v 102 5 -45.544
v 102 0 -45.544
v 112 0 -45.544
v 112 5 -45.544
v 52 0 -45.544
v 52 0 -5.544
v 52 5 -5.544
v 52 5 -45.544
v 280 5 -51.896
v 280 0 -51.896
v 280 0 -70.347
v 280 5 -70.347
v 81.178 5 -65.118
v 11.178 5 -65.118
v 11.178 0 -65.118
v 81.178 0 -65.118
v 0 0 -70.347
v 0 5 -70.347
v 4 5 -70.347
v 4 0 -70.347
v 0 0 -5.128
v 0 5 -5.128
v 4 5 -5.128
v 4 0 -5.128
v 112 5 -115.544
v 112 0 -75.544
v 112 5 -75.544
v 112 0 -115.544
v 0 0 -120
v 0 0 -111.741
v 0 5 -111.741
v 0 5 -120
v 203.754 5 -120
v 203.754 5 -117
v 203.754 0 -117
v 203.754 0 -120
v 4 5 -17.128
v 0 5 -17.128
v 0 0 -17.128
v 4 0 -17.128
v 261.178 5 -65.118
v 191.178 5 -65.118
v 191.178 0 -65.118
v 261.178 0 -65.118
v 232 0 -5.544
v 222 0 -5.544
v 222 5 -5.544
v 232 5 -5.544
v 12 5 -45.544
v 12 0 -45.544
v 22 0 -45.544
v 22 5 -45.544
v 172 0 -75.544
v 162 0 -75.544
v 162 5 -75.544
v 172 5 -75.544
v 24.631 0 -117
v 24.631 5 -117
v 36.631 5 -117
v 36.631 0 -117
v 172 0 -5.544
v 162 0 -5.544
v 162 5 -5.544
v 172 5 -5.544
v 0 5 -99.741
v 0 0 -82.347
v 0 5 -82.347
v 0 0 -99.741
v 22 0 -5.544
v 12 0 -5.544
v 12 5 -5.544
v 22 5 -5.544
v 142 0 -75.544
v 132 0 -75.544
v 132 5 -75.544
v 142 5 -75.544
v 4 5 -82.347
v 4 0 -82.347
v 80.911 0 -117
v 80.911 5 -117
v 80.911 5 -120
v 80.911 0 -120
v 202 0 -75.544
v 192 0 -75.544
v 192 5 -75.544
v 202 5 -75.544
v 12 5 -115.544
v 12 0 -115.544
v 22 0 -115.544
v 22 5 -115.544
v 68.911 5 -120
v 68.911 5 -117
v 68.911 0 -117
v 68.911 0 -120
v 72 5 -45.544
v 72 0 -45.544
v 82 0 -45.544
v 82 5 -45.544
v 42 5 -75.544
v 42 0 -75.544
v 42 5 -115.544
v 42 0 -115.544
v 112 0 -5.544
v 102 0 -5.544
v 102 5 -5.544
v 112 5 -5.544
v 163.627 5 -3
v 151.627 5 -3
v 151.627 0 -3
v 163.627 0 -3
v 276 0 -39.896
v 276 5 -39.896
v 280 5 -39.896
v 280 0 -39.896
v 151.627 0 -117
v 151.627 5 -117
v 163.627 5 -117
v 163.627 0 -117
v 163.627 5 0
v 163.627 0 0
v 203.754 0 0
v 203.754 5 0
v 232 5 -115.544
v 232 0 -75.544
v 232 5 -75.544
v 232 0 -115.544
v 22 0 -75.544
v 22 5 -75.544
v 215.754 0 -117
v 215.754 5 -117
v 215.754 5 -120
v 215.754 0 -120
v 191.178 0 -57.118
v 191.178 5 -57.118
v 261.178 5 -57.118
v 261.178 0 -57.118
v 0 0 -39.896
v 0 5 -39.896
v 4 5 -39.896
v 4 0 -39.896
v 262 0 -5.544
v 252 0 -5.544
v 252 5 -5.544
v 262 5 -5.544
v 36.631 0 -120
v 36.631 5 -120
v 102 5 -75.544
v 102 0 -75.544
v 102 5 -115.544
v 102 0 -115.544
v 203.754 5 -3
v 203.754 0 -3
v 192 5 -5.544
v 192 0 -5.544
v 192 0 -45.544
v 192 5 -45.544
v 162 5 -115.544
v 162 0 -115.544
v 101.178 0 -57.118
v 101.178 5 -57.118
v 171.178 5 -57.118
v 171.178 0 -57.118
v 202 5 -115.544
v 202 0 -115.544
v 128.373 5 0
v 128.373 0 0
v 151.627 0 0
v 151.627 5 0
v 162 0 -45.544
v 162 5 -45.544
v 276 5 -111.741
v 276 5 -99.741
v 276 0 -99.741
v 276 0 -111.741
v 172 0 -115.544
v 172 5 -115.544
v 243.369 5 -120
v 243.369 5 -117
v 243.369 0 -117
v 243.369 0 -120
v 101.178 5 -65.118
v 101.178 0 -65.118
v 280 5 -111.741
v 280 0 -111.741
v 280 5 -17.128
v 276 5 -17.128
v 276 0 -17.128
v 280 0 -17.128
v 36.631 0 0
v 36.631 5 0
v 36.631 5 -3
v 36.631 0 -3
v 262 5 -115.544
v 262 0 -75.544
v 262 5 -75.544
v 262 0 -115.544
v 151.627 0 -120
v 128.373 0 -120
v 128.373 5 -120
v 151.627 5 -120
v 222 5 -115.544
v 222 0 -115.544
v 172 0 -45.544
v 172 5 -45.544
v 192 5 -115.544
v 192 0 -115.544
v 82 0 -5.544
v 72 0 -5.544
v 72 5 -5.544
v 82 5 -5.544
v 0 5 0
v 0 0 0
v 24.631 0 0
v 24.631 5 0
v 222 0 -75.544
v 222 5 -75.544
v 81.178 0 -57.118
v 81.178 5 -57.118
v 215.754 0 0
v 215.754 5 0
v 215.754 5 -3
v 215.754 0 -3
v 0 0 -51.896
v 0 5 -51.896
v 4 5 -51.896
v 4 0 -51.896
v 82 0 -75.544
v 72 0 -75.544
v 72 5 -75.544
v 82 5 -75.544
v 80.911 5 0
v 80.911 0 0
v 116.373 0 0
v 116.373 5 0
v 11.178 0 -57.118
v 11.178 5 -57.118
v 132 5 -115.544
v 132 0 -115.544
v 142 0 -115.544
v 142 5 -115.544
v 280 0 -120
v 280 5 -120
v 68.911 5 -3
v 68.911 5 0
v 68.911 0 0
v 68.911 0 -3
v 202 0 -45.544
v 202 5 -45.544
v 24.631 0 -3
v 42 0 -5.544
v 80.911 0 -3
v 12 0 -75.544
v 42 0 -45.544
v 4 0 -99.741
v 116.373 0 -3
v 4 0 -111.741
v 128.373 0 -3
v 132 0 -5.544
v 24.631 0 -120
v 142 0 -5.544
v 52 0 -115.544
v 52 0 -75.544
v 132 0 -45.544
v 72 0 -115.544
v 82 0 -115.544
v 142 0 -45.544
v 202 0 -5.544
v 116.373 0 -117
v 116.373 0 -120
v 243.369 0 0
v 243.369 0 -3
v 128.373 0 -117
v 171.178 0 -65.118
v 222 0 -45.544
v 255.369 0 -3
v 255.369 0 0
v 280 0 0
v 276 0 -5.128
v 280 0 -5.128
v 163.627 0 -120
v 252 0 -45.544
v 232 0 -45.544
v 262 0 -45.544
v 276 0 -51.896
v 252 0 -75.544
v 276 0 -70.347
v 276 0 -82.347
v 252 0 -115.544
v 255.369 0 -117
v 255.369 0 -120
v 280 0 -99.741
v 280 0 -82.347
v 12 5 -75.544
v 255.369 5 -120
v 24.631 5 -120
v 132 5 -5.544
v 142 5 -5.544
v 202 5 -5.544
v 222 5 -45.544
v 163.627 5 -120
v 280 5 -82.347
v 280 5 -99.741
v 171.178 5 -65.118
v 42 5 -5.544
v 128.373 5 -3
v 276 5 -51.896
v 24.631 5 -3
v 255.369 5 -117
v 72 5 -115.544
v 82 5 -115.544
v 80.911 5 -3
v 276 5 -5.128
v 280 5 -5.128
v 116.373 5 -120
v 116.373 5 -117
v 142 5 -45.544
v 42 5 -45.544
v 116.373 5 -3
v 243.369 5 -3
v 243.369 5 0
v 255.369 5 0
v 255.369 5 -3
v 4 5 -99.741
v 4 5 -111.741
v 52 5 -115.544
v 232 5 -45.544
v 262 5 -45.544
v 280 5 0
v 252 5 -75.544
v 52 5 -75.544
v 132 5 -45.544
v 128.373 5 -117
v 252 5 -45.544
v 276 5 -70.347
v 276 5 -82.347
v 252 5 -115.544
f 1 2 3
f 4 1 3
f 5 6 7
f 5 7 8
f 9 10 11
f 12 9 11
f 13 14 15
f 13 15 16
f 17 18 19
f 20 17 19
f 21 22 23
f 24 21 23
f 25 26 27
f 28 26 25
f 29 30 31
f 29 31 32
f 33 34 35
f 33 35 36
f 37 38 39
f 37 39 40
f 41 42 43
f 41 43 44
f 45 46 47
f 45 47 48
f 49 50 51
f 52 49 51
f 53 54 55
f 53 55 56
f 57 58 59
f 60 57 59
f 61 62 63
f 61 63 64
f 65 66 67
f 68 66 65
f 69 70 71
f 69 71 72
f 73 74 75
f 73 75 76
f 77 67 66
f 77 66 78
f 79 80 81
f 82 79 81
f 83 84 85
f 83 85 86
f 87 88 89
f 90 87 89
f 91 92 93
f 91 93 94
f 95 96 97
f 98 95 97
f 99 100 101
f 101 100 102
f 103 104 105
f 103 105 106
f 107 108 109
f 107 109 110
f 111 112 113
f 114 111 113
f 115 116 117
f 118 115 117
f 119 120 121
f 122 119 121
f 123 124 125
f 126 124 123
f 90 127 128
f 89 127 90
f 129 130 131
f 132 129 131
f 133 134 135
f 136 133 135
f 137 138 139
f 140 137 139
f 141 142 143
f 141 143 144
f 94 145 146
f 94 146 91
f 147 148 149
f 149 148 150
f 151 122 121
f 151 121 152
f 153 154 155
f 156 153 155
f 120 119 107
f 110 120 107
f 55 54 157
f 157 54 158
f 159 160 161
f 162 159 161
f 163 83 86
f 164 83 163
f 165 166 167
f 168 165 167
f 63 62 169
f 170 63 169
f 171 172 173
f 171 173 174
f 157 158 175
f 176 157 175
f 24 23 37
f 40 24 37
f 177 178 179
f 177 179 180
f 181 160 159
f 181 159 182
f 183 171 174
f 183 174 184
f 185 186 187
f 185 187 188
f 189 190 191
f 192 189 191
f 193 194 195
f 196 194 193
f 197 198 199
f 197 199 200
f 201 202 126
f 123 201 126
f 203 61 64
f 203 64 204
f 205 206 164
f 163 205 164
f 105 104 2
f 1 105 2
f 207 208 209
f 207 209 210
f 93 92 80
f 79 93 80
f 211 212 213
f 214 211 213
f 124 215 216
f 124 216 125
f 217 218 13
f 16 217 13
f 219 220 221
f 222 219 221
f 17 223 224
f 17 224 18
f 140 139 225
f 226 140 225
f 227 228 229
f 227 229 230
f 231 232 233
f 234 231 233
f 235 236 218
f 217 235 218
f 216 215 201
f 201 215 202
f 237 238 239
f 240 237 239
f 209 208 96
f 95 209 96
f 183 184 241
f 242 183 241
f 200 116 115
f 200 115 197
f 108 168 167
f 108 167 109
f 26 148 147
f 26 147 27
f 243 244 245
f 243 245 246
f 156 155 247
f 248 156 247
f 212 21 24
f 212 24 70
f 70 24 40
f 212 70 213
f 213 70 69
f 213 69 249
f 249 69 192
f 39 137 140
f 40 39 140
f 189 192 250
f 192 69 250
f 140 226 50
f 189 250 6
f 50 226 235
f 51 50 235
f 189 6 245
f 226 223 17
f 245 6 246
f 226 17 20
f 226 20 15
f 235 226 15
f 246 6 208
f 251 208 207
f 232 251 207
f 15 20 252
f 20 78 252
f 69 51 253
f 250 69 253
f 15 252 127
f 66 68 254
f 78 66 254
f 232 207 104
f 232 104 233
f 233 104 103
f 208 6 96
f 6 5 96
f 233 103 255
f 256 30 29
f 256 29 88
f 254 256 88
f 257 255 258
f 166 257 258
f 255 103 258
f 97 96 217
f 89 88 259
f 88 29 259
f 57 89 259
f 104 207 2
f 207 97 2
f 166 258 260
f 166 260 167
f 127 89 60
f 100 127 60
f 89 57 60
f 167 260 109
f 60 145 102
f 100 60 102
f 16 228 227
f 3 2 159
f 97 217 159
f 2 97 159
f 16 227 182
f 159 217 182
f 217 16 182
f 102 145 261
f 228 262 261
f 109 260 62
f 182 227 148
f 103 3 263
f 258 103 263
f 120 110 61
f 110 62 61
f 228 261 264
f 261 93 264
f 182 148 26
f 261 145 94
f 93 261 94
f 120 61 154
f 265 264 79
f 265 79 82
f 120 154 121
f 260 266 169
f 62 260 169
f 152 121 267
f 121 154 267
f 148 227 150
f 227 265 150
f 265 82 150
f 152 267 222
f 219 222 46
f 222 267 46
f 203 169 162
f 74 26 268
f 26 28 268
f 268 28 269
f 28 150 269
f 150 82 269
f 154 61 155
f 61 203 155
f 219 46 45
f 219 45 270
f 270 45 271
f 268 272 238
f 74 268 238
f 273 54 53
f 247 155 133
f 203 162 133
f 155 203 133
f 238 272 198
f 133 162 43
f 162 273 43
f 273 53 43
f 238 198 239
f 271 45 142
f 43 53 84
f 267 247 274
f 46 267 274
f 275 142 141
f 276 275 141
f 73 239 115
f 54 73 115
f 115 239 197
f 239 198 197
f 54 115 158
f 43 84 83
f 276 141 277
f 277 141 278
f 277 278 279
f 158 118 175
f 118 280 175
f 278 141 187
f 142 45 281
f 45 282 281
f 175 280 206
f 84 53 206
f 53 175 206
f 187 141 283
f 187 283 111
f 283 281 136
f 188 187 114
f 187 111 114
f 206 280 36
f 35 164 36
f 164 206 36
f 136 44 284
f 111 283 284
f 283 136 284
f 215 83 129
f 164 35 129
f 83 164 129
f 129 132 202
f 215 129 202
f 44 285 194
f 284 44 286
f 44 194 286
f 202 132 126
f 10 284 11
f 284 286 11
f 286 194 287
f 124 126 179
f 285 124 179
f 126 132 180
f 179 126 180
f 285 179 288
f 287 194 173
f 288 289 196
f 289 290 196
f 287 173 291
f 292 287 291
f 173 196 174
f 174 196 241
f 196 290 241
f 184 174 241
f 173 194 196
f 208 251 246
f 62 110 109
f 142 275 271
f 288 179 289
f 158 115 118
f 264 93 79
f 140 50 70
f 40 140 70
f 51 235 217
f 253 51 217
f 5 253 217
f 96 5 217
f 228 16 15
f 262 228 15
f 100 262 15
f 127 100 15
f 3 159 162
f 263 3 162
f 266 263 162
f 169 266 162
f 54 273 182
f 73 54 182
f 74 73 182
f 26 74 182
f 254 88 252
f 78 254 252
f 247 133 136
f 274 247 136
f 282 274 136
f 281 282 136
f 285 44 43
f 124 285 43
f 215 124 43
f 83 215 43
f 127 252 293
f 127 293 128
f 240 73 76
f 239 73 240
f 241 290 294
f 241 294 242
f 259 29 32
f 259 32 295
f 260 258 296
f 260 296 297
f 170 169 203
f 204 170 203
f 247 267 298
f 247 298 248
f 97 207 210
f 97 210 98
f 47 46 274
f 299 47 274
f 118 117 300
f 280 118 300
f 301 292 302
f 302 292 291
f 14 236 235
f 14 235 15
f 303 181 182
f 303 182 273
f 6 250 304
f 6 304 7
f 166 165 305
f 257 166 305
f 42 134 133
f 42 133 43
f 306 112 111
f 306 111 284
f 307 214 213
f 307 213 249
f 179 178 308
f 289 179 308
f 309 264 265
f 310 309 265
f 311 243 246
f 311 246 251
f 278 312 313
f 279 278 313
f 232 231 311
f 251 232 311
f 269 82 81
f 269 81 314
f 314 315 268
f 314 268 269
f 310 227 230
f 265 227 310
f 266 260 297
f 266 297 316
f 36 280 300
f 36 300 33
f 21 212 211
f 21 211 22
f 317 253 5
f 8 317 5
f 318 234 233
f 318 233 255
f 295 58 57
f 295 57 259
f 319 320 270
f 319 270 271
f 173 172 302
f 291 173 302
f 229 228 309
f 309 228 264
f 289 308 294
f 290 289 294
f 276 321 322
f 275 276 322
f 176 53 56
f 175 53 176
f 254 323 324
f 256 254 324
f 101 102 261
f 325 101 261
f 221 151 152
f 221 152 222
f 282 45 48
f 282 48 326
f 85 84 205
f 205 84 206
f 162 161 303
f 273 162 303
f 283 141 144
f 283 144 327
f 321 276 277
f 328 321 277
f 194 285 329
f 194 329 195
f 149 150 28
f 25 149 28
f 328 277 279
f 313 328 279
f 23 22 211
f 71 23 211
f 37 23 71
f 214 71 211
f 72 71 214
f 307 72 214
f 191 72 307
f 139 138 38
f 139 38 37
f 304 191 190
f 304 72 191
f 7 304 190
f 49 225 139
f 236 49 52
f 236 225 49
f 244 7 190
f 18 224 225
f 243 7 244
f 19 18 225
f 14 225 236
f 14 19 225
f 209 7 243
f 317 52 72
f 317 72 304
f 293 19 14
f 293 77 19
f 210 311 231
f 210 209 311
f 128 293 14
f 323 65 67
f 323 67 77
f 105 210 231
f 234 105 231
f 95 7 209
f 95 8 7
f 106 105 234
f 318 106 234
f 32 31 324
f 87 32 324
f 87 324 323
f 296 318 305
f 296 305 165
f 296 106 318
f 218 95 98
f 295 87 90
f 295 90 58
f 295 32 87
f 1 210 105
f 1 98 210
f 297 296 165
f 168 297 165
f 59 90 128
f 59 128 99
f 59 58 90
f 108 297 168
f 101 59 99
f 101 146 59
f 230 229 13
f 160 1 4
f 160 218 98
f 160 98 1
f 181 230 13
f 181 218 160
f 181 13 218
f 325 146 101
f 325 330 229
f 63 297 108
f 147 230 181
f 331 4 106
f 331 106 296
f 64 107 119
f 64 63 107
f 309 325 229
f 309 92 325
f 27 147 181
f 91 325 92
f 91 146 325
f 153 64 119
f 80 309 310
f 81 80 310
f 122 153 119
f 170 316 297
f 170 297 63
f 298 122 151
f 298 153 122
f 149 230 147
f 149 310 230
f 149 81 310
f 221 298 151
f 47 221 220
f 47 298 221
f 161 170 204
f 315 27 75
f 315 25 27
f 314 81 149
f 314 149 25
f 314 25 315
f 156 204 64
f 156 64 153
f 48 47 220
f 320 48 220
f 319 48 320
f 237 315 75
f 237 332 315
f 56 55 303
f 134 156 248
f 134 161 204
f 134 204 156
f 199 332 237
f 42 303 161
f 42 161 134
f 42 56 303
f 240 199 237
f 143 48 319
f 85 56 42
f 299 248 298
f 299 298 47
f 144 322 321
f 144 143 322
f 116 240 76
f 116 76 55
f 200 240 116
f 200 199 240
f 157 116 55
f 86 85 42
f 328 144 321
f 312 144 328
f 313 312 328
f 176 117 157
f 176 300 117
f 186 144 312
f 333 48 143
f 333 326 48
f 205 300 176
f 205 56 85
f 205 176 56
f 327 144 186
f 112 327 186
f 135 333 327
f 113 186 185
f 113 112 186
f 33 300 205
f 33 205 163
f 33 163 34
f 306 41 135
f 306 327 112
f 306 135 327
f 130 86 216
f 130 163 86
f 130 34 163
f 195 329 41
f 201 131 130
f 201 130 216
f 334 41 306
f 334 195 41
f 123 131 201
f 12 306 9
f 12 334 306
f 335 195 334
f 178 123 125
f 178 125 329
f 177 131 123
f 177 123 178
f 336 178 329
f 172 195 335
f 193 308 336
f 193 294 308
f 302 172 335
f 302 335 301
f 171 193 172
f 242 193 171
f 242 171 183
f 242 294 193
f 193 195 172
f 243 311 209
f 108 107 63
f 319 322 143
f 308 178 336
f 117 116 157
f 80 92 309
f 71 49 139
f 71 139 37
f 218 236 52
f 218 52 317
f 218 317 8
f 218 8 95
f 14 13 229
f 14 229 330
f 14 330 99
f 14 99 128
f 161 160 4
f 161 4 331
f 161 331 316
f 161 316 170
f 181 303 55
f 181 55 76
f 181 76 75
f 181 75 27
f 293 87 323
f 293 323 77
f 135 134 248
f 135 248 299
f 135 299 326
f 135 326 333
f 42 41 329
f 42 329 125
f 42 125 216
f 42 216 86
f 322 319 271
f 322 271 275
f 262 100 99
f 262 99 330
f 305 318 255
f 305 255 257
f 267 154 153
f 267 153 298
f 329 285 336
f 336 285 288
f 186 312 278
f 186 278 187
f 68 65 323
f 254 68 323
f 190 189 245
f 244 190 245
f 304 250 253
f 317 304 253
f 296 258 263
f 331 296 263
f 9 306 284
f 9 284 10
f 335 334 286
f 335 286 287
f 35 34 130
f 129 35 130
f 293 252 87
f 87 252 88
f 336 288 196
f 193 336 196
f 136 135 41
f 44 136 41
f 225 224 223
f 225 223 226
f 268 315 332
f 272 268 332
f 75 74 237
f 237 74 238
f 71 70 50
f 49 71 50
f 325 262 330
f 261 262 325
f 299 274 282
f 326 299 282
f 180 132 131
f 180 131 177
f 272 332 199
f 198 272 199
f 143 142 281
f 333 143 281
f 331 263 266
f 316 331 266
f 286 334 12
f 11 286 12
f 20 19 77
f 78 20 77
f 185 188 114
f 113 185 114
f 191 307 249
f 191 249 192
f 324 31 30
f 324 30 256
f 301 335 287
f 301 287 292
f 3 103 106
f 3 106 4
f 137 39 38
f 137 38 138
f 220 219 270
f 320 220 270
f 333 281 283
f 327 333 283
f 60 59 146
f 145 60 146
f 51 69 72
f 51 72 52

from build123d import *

# Parameters (mm, degrees)
SKETCH1_W           = 280
SKETCH1_H           = 120
BOSS_EXTRUDE1_DEPTH = 5
SKETCH1_3_W         = 10
SKETCH1_3_H         = 40
CUT_EXTRUDE1_DEPTH  = 134
SKETCH1_4_W         = 10
SKETCH1_4_H         = 40
CUT_EXTRUDE2_DEPTH  = 229
SKETCH4_W           = 70
SKETCH4_H           = 8
CUT_EXTRUDE4_DEPTH  = 229
SKETCH3_W           = 4
SKETCH3_H           = 12
SKETCH3_W_2         = 12
SKETCH3_H_2         = 3
CUT_EXTRUDE5_DEPTH  = 10


with BuildPart() as part:
    # Sketch1 → Boss-Extrude1 (new body)
    with BuildSketch(Plane(origin=(0, 0, 0), x_dir=(1, 0, 0), z_dir=(0, 1, 0))):
        with Locations((140, 60)):
            Rectangle(SKETCH1_W, SKETCH1_H)
    extrude(amount=BOSS_EXTRUDE1_DEPTH)

    # Sketch1<3> → Cut-Extrude1 (cut)
    with BuildSketch(Plane(origin=(0, 0, 0), x_dir=(1, 0, 0), z_dir=(0, 1, 0))):
        with Locations((227, 95.54438009)):
            Rectangle(SKETCH1_3_W, SKETCH1_3_H)
        with Locations((227, 25.54438009)):
            Rectangle(SKETCH1_3_W, SKETCH1_3_H)
        with Locations((197, 25.54438009)):
            Rectangle(SKETCH1_3_W, SKETCH1_3_H)
        with Locations((167, 25.54438009)):
            Rectangle(SKETCH1_3_W, SKETCH1_3_H)
        with Locations((167, 95.54438009)):
            Rectangle(SKETCH1_3_W, SKETCH1_3_H)
        with Locations((137, 95.54438009)):
            Rectangle(SKETCH1_3_W, SKETCH1_3_H)
        with Locations((107, 95.54438009)):
            Rectangle(SKETCH1_3_W, SKETCH1_3_H)
        with Locations((107, 25.54438009)):
            Rectangle(SKETCH1_3_W, SKETCH1_3_H)
        with Locations((77, 25.54438009)):
            Rectangle(SKETCH1_3_W, SKETCH1_3_H)
        with Locations((47, 95.54438009)):
            Rectangle(SKETCH1_3_W, SKETCH1_3_H)
        with Locations((47, 25.54438009)):
            Rectangle(SKETCH1_3_W, SKETCH1_3_H)
        with Locations((257, 95.54438009)):
            Rectangle(SKETCH1_3_W, SKETCH1_3_H)
        with Locations((257, 25.54438009)):
            Rectangle(SKETCH1_3_W, SKETCH1_3_H)
        with Locations((197, 95.54438009)):
            Rectangle(SKETCH1_3_W, SKETCH1_3_H)
        with Locations((137, 25.54438009)):
            Rectangle(SKETCH1_3_W, SKETCH1_3_H)
        with Locations((77, 95.54438009)):
            Rectangle(SKETCH1_3_W, SKETCH1_3_H)
        with Locations((17, 25.54438009)):
            Rectangle(SKETCH1_3_W, SKETCH1_3_H)
    extrude(amount=CUT_EXTRUDE1_DEPTH, mode=Mode.SUBTRACT)

    # Sketch1<4> → Cut-Extrude2 (cut)
    with BuildSketch(Plane(origin=(0, 0, 0), x_dir=(1, 0, 0), z_dir=(0, 1, 0))):
        with Locations((17, 95.54438009)):
            Rectangle(SKETCH1_4_W, SKETCH1_4_H)
    extrude(amount=CUT_EXTRUDE2_DEPTH, mode=Mode.SUBTRACT)

    # Sketch4 → Cut-Extrude4 (cut)
    with BuildSketch(Plane(origin=(0, 5, 0), x_dir=(1, 0, 0), z_dir=(0, 1, 0))):
        with Locations((136.177664652, 61.117706899)):
            Rectangle(SKETCH4_W, SKETCH4_H)
        with Locations((46.177664652, 61.117706899)):
            Rectangle(SKETCH4_W, SKETCH4_H)
        with Locations((226.177664652, 61.117706899)):
            Rectangle(SKETCH4_W, SKETCH4_H)
    extrude(amount=-CUT_EXTRUDE4_DEPTH, mode=Mode.SUBTRACT)

    # Sketch3 → Cut-Extrude5 (cut)
    with BuildSketch(Plane(origin=(0, 5, 0), x_dir=(1, 0, 0), z_dir=(0, 1, 0))):
        with Locations((278, 11.128497482)):
            Rectangle(SKETCH3_W, SKETCH3_H)
        with Locations((30.63115044, 1.5)):
            Rectangle(SKETCH3_W_2, SKETCH3_H_2)
        with Locations((74.910678106, 1.5)):
            Rectangle(SKETCH3_W_2, SKETCH3_H_2)
        with Locations((122.372965913, 1.5)):
            Rectangle(SKETCH3_W_2, SKETCH3_H_2)
        with Locations((157.627034087, 1.5)):
            Rectangle(SKETCH3_W_2, SKETCH3_H_2)
        with Locations((209.75390842, 1.5)):
            Rectangle(SKETCH3_W_2, SKETCH3_H_2)
        with Locations((249.36884956, 1.5)):
            Rectangle(SKETCH3_W_2, SKETCH3_H_2)
        with Locations((278, 45.895590182)):
            Rectangle(SKETCH3_W, SKETCH3_H)
        with Locations((278, 105.740728373)):
            Rectangle(SKETCH3_W, SKETCH3_H)
        with Locations((278, 76.34695717)):
            Rectangle(SKETCH3_W, SKETCH3_H)
        with Locations((249.36884956, 118.5)):
            Rectangle(SKETCH3_W_2, SKETCH3_H_2)
        with Locations((209.75390842, 118.5)):
            Rectangle(SKETCH3_W_2, SKETCH3_H_2)
        with Locations((157.627034087, 118.5)):
            Rectangle(SKETCH3_W_2, SKETCH3_H_2)
        with Locations((122.372965913, 118.5)):
            Rectangle(SKETCH3_W_2, SKETCH3_H_2)
        with Locations((74.910678106, 118.5)):
            Rectangle(SKETCH3_W_2, SKETCH3_H_2)
        with Locations((30.63115044, 118.5)):
            Rectangle(SKETCH3_W_2, SKETCH3_H_2)
        with Locations((2, 105.740728373)):
            Rectangle(SKETCH3_W, SKETCH3_H)
        with Locations((2, 76.34695717)):
            Rectangle(SKETCH3_W, SKETCH3_H)
        with Locations((2, 45.895590182)):
            Rectangle(SKETCH3_W, SKETCH3_H)
        with Locations((2, 11.128497482)):
            Rectangle(SKETCH3_W, SKETCH3_H)
    extrude(amount=-CUT_EXTRUDE5_DEPTH, mode=Mode.SUBTRACT)


solid = part.part
